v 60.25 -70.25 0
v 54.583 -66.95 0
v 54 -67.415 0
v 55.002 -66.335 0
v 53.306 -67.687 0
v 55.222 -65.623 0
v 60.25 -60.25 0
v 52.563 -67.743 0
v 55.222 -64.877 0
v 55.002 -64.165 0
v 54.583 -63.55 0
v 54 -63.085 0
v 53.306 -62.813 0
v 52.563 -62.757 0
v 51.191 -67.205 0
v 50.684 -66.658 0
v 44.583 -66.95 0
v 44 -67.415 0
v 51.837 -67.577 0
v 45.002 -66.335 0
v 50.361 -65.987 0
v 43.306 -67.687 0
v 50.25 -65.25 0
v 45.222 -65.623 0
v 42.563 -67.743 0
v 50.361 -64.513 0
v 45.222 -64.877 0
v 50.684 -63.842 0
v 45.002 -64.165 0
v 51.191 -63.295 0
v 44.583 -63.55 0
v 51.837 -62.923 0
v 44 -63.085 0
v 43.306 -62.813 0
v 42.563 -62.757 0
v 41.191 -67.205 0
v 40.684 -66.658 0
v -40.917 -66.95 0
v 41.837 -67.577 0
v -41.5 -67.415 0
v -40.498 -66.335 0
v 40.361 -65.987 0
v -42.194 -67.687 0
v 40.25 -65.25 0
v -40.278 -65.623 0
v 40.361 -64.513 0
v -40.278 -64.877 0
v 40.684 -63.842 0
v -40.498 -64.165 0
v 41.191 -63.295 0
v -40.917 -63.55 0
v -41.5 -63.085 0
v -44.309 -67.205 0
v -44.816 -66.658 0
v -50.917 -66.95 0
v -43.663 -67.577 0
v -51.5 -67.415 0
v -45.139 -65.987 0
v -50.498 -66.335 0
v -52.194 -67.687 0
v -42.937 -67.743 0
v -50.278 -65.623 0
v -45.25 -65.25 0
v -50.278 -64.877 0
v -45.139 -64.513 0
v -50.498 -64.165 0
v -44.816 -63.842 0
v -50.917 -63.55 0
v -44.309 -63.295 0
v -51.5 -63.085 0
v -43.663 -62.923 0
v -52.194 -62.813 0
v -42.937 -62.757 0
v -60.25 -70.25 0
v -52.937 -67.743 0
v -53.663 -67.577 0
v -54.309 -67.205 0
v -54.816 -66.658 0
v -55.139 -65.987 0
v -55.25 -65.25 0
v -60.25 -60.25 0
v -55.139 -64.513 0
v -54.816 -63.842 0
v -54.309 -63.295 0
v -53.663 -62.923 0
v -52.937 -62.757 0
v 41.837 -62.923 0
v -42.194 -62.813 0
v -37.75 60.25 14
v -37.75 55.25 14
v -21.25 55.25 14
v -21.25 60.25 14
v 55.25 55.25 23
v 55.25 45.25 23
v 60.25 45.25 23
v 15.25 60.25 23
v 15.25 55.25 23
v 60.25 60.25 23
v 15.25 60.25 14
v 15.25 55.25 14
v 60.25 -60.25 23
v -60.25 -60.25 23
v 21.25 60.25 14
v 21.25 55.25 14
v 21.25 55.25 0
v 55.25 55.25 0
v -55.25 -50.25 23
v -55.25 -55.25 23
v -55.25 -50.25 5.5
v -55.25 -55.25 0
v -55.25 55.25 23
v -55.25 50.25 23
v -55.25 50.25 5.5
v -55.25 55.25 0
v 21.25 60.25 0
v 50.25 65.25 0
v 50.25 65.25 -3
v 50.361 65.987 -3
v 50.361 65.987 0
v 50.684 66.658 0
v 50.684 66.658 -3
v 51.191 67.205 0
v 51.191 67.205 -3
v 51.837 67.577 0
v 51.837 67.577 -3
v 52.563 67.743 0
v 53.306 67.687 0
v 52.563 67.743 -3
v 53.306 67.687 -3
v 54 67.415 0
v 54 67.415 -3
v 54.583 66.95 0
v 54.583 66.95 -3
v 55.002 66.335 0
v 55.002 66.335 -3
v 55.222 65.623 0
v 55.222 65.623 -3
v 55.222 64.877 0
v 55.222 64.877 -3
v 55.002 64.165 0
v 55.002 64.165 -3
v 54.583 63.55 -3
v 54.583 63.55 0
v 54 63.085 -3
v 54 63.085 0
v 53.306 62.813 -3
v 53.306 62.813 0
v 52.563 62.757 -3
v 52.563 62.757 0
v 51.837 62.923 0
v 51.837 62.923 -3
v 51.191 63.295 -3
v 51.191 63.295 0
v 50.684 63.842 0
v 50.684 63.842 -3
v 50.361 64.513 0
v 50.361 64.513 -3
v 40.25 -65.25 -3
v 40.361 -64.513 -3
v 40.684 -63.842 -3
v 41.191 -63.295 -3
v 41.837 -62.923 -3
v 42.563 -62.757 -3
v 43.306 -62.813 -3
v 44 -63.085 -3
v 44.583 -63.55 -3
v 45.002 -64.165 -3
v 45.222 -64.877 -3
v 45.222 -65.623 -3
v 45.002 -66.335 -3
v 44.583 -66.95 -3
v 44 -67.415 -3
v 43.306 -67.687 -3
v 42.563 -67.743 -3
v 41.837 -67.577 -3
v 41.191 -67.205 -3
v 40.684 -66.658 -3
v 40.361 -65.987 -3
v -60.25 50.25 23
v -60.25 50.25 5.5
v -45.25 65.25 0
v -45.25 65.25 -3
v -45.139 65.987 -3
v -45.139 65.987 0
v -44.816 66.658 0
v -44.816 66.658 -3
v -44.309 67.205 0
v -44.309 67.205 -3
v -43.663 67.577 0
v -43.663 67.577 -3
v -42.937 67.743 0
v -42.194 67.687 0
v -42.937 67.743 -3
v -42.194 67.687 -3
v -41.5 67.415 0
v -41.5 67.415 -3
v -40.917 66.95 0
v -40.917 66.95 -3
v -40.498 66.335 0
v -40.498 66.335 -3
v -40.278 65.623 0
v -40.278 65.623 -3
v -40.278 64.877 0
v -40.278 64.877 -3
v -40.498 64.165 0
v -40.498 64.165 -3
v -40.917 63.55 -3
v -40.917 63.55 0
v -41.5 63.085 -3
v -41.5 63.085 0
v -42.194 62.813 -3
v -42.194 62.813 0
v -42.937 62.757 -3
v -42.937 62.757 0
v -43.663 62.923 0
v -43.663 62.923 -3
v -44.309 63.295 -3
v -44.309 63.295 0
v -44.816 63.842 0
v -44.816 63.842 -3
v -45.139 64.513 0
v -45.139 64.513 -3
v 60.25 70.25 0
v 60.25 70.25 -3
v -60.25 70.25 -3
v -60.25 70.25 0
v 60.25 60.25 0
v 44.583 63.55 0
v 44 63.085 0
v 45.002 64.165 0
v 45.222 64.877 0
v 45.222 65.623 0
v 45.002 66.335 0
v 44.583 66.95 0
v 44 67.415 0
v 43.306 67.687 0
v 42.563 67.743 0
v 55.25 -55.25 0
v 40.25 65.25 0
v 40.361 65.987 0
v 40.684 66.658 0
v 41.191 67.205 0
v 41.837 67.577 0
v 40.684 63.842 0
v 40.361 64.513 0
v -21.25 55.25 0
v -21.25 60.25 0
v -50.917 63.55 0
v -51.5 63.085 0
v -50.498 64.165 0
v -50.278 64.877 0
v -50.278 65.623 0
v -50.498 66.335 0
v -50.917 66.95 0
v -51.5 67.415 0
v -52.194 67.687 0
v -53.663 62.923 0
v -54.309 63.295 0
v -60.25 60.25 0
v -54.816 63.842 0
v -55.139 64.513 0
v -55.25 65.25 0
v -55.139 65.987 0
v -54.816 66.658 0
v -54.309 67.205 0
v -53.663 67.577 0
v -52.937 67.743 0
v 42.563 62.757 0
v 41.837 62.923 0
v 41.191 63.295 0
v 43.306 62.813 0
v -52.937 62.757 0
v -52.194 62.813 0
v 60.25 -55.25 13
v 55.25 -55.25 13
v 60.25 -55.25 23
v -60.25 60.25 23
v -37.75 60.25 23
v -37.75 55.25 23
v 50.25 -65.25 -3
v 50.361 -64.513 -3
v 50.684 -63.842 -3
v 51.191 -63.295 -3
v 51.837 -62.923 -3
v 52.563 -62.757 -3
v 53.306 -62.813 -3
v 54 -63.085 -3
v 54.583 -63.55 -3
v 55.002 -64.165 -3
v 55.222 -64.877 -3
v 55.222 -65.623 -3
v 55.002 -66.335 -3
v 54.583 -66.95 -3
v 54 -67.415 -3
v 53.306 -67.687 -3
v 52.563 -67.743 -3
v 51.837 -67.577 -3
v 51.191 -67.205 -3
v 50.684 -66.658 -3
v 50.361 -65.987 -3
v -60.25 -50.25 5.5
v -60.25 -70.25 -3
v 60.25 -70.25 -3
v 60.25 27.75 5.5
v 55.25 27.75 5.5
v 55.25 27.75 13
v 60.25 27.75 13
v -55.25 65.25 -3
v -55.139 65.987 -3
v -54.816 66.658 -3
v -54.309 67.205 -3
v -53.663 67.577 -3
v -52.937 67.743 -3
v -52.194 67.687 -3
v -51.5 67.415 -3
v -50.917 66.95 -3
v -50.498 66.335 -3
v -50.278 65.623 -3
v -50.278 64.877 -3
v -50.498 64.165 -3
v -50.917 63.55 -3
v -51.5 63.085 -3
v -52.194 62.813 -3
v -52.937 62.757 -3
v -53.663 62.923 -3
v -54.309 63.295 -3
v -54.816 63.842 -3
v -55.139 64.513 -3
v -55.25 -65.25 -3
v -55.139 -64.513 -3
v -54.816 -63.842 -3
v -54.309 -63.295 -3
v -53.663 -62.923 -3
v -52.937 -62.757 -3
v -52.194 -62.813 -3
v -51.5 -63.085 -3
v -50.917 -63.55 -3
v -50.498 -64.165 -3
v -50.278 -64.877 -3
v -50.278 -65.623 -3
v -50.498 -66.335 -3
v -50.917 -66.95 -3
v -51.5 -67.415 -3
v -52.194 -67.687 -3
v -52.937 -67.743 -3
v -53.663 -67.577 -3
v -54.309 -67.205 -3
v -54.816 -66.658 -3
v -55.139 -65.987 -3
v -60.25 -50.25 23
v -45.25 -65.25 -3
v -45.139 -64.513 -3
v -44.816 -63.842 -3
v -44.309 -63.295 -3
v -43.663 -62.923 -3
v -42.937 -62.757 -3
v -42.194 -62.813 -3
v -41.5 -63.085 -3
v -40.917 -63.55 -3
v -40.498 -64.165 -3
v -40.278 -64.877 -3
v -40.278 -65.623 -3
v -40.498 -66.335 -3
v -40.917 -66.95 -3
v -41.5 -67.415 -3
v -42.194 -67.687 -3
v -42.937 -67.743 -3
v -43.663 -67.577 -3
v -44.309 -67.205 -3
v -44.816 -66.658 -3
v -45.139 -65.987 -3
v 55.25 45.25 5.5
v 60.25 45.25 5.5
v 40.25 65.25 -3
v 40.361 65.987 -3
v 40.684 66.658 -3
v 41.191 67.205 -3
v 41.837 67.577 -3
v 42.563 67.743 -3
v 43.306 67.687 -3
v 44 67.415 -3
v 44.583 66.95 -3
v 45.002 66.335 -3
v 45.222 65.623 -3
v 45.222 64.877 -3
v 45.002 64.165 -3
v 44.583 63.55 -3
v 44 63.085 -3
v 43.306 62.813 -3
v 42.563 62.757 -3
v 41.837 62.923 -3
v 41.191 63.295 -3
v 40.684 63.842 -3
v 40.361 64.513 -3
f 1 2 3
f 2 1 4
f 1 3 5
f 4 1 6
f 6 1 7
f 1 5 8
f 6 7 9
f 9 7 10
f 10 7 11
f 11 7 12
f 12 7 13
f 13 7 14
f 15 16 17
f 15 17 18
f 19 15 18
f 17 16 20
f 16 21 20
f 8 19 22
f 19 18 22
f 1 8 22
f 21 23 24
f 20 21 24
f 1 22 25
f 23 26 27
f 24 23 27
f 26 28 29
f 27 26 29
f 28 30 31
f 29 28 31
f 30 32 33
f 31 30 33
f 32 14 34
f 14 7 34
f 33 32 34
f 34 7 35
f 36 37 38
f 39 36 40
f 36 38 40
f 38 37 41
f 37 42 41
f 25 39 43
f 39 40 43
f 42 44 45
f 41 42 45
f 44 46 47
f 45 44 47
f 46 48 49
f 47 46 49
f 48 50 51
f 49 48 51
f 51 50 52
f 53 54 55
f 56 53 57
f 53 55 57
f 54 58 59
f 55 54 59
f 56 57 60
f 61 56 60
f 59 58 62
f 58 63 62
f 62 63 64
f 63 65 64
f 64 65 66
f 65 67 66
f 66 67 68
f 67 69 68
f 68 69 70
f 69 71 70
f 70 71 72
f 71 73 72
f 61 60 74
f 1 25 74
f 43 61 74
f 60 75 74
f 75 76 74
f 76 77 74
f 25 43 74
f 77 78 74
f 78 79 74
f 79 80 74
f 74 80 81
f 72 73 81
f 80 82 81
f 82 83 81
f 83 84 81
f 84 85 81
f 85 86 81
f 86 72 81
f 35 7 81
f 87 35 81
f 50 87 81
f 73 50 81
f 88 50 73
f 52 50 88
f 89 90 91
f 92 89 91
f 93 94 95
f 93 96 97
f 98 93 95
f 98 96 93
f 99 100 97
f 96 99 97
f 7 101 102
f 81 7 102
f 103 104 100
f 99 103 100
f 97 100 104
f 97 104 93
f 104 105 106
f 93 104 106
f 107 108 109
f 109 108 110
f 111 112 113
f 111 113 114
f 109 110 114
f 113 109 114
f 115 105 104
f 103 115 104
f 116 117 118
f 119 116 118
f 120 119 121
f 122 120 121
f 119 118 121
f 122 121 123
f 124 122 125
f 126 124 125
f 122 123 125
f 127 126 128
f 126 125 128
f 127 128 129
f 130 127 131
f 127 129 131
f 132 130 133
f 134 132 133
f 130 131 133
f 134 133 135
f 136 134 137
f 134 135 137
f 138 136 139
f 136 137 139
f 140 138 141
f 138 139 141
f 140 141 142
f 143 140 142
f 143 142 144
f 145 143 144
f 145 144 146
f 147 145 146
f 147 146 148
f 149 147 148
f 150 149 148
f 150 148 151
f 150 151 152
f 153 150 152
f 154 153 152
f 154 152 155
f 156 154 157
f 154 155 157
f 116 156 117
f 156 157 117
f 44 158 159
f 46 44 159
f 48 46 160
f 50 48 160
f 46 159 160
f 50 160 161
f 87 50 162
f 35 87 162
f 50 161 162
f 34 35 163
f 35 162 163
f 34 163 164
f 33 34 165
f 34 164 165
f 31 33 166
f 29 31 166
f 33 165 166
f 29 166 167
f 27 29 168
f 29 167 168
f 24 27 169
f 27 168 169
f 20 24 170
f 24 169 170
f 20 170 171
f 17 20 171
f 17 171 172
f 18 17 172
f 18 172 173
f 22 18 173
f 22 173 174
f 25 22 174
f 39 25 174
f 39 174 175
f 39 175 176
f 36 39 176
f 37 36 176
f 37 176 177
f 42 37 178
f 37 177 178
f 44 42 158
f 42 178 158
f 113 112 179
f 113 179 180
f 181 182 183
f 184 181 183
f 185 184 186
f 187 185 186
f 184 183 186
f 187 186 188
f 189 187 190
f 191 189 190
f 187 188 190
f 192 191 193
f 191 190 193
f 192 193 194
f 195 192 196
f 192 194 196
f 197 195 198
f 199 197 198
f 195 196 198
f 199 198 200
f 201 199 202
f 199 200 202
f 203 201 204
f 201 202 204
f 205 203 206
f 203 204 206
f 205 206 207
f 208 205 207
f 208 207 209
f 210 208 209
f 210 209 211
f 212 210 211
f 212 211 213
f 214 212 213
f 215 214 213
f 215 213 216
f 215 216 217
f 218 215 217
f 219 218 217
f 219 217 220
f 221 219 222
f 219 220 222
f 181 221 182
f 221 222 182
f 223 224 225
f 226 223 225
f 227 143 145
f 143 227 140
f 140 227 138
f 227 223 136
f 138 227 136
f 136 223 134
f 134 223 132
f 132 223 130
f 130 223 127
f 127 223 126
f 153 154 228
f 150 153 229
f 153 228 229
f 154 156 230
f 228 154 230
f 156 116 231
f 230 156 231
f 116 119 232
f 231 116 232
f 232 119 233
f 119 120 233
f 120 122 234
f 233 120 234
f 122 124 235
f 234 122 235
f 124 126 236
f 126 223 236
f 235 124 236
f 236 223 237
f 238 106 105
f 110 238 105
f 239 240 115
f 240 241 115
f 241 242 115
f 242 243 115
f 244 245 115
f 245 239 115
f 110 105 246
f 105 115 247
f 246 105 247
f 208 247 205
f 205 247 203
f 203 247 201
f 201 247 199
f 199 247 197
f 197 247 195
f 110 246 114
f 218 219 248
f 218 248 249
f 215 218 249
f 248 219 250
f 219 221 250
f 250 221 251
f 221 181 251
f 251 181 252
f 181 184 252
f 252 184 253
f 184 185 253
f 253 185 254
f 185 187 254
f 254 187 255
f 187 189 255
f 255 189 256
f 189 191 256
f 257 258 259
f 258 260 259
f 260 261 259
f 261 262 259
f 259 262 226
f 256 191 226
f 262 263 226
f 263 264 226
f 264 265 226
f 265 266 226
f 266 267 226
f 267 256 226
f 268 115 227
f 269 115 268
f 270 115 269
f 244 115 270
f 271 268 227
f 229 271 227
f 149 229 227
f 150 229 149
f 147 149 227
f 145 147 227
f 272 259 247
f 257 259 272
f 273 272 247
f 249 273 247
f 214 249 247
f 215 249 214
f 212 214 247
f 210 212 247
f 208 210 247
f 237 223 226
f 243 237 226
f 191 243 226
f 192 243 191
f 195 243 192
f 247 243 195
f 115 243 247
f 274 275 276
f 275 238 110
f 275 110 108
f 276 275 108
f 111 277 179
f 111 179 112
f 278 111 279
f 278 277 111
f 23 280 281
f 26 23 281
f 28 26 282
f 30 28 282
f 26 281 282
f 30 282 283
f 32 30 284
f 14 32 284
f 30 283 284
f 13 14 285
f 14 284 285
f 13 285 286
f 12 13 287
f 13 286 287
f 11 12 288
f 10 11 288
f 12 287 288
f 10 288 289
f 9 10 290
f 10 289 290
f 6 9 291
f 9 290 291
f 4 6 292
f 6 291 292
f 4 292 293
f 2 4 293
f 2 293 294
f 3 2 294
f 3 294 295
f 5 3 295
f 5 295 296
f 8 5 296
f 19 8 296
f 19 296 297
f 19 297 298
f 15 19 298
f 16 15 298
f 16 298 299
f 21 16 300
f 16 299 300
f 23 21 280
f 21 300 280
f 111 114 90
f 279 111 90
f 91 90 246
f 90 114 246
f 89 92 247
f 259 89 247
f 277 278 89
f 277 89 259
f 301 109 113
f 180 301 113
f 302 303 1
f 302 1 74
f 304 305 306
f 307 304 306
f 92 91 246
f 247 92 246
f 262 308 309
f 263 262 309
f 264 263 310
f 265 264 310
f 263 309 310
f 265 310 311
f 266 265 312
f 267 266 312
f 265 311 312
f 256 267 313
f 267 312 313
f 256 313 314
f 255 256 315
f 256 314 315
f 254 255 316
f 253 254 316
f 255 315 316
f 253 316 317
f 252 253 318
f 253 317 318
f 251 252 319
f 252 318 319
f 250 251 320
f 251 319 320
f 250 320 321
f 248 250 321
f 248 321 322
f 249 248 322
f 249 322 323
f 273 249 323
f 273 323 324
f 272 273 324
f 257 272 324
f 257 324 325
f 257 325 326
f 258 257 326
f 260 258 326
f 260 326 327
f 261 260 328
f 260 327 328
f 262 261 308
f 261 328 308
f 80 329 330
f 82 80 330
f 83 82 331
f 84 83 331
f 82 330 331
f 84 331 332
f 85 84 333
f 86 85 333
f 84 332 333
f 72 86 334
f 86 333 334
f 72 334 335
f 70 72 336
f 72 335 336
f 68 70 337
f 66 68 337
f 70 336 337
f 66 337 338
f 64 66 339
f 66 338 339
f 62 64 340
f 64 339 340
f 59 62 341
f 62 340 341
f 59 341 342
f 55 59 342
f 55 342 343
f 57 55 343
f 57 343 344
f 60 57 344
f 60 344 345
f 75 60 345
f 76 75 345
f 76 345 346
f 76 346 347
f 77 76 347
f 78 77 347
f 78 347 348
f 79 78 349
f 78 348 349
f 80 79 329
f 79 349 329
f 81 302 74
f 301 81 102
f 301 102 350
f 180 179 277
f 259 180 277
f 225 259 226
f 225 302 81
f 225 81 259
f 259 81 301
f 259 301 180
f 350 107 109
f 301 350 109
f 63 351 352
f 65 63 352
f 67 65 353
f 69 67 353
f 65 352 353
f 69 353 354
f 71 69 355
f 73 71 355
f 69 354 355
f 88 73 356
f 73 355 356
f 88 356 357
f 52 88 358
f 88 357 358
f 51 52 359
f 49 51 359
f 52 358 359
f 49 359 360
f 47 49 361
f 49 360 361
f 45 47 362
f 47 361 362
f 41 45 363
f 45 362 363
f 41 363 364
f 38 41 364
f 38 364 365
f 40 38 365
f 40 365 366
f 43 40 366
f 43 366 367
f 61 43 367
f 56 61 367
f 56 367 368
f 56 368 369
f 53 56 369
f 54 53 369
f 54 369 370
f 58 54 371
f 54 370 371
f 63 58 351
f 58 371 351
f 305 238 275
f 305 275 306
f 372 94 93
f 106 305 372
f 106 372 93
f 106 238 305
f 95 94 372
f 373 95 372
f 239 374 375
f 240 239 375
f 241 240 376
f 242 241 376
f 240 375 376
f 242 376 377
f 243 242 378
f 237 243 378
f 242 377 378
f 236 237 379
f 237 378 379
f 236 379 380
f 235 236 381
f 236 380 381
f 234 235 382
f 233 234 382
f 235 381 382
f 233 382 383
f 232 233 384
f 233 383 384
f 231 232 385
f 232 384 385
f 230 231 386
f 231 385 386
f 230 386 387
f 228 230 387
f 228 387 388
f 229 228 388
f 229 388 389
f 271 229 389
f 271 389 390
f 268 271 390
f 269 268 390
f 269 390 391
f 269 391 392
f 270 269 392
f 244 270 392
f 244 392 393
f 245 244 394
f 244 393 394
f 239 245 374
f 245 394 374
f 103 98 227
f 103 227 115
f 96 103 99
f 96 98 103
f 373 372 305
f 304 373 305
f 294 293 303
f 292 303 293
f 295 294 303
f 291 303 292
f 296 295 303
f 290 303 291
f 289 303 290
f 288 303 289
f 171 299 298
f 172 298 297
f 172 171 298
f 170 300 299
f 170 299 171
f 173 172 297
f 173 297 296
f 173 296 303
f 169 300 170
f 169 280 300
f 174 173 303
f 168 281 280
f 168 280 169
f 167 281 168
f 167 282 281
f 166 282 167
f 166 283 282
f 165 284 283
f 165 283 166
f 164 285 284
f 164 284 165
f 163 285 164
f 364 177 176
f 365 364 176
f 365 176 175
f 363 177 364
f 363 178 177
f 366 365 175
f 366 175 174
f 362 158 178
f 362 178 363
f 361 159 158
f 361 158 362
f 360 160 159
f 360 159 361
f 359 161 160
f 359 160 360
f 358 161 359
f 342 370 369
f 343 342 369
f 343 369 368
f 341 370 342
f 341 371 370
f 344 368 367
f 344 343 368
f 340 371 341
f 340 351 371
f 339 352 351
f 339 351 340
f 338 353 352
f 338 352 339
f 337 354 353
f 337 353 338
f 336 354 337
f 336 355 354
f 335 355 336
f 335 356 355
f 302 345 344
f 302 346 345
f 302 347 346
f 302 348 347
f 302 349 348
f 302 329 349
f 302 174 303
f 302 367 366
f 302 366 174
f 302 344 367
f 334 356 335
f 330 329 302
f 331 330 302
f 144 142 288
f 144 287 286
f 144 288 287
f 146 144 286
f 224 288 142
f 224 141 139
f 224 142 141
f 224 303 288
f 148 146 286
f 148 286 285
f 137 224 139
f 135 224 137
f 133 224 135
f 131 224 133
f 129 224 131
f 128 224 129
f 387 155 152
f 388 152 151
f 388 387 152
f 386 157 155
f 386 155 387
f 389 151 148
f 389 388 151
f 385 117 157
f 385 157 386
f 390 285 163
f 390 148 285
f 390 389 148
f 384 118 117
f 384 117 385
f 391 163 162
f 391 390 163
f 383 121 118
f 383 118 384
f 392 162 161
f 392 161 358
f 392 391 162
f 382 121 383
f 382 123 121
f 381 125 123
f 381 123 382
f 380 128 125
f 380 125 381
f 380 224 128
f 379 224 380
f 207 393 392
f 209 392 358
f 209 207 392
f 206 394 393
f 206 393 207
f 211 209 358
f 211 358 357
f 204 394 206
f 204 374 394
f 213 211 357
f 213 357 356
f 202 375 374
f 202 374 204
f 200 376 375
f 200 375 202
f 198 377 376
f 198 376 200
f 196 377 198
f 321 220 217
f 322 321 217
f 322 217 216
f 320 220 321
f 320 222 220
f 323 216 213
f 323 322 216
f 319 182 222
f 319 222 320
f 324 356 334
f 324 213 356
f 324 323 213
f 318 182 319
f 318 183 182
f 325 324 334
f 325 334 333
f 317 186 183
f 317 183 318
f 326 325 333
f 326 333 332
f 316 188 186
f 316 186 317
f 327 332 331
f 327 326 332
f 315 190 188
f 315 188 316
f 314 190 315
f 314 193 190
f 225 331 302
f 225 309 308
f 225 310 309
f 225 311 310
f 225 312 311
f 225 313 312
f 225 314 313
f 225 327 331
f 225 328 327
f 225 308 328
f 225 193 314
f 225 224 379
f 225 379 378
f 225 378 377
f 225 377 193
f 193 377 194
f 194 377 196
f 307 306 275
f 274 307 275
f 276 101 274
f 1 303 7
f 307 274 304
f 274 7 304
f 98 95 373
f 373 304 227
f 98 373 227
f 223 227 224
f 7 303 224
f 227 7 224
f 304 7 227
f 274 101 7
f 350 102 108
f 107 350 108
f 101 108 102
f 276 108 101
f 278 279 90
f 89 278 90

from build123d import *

# Parameters (mm, degrees)
SKETCH1_W           = 120.5
SKETCH1_H           = 120.5
SKETCH1_W_2         = 110.5
SKETCH1_H_2         = 110.5
BOSS_EXTRUDE1_DEPTH = 23
SKETCH2_W           = 120.5
SKETCH2_H           = 120.5
BOSS_EXTRUDE2_DEPTH = 3
SKETCH3_W           = 17.5
SKETCH3_H           = 100.5
CUT_EXTRUDE1_DEPTH  = 47
CUT_EXTRUDE2_DEPTH  = 47
CUT_EXTRUDE3_DEPTH  = 47
SKETCH7_W           = 120.5
SKETCH7_H           = 10
SKETCH7_R           = 2.5
BOSS_EXTRUDE3_DEPTH = 3


with BuildPart() as part:
    # Sketch1 → Boss-Extrude1 (new body)
    with BuildSketch(Plane.XY):
        Rectangle(SKETCH1_W, SKETCH1_H)
        Rectangle(SKETCH1_W_2, SKETCH1_H_2, mode=Mode.SUBTRACT)
    extrude(amount=BOSS_EXTRUDE1_DEPTH)

    # Sketch2 → Boss-Extrude2 (add)
    with BuildSketch(Plane(origin=(0, 0, 0), x_dir=(-1, 0, 0), z_dir=(0, 0, -1))):
        Rectangle(SKETCH2_W, SKETCH2_H)
    extrude(amount=BOSS_EXTRUDE2_DEPTH)

    # Sketch3 → Cut-Extrude1 (cut)
    with BuildSketch(Plane(origin=(-55.25, 0, 0), x_dir=(0, 0, -1), z_dir=(1, 0, 0))):
        with Locations((-14.25, 0)):
            Rectangle(SKETCH3_W, SKETCH3_H)
    extrude(amount=-CUT_EXTRUDE1_DEPTH, mode=Mode.SUBTRACT)

    # Sketch5 → Cut-Extrude2 (cut)
    with BuildSketch(Plane.XZ.offset(-55.25)):
        Polygon((-37.75, 23), (-37.75, 14), (-21.25, 14), (-21.25, 0), (21.25, 0), (21.25, 14), (15.25, 14), (15.25, 23), align=None)
    extrude(amount=-CUT_EXTRUDE2_DEPTH, mode=Mode.SUBTRACT)

    # Sketch6 → Cut-Extrude3 (cut)
    with BuildSketch(Plane.ZY.offset(-55.25)):
        Polygon((23, 45.25), (5.5, 45.25), (5.5, 27.75), (13, 27.75), (13, -55.25), (23, -55.25), align=None)
    extrude(amount=-CUT_EXTRUDE3_DEPTH, mode=Mode.SUBTRACT)

    # Sketch7 → Boss-Extrude3 (add)
    # profile 1 of 2: a face of its own
    with BuildSketch(Plane(origin=(0, 0, -3), x_dir=(-1, 0, 0), z_dir=(0, 0, -1))):
        with Locations((0, 65.25)):
            Rectangle(SKETCH7_W, SKETCH7_H)
        with Locations((-52.75, 65.25)):
            Circle(SKETCH7_R, mode=Mode.SUBTRACT)
        with Locations((-42.75, 65.25)):
            Circle(SKETCH7_R, mode=Mode.SUBTRACT)
        with Locations((52.75, 65.25)):
            Circle(SKETCH7_R, mode=Mode.SUBTRACT)
        with Locations((42.75, 65.25)):
            Circle(SKETCH7_R, mode=Mode.SUBTRACT)
    # profile 2 of 2: a face of its own
    with BuildSketch(Plane(origin=(0, 0, -3), x_dir=(-1, 0, 0), z_dir=(0, 0, -1))):
        with Locations((0, -65.25)):
            Rectangle(SKETCH7_W, SKETCH7_H)
        with Locations((-52.75, -65.25)):
            Circle(SKETCH7_R, mode=Mode.SUBTRACT)
        with Locations((-42.75, -65.25)):
            Circle(SKETCH7_R, mode=Mode.SUBTRACT)
        with Locations((42.75, -65.25)):
            Circle(SKETCH7_R, mode=Mode.SUBTRACT)
        with Locations((52.75, -65.25)):
            Circle(SKETCH7_R, mode=Mode.SUBTRACT)
    extrude(amount=-BOSS_EXTRUDE3_DEPTH)


solid = part.part
